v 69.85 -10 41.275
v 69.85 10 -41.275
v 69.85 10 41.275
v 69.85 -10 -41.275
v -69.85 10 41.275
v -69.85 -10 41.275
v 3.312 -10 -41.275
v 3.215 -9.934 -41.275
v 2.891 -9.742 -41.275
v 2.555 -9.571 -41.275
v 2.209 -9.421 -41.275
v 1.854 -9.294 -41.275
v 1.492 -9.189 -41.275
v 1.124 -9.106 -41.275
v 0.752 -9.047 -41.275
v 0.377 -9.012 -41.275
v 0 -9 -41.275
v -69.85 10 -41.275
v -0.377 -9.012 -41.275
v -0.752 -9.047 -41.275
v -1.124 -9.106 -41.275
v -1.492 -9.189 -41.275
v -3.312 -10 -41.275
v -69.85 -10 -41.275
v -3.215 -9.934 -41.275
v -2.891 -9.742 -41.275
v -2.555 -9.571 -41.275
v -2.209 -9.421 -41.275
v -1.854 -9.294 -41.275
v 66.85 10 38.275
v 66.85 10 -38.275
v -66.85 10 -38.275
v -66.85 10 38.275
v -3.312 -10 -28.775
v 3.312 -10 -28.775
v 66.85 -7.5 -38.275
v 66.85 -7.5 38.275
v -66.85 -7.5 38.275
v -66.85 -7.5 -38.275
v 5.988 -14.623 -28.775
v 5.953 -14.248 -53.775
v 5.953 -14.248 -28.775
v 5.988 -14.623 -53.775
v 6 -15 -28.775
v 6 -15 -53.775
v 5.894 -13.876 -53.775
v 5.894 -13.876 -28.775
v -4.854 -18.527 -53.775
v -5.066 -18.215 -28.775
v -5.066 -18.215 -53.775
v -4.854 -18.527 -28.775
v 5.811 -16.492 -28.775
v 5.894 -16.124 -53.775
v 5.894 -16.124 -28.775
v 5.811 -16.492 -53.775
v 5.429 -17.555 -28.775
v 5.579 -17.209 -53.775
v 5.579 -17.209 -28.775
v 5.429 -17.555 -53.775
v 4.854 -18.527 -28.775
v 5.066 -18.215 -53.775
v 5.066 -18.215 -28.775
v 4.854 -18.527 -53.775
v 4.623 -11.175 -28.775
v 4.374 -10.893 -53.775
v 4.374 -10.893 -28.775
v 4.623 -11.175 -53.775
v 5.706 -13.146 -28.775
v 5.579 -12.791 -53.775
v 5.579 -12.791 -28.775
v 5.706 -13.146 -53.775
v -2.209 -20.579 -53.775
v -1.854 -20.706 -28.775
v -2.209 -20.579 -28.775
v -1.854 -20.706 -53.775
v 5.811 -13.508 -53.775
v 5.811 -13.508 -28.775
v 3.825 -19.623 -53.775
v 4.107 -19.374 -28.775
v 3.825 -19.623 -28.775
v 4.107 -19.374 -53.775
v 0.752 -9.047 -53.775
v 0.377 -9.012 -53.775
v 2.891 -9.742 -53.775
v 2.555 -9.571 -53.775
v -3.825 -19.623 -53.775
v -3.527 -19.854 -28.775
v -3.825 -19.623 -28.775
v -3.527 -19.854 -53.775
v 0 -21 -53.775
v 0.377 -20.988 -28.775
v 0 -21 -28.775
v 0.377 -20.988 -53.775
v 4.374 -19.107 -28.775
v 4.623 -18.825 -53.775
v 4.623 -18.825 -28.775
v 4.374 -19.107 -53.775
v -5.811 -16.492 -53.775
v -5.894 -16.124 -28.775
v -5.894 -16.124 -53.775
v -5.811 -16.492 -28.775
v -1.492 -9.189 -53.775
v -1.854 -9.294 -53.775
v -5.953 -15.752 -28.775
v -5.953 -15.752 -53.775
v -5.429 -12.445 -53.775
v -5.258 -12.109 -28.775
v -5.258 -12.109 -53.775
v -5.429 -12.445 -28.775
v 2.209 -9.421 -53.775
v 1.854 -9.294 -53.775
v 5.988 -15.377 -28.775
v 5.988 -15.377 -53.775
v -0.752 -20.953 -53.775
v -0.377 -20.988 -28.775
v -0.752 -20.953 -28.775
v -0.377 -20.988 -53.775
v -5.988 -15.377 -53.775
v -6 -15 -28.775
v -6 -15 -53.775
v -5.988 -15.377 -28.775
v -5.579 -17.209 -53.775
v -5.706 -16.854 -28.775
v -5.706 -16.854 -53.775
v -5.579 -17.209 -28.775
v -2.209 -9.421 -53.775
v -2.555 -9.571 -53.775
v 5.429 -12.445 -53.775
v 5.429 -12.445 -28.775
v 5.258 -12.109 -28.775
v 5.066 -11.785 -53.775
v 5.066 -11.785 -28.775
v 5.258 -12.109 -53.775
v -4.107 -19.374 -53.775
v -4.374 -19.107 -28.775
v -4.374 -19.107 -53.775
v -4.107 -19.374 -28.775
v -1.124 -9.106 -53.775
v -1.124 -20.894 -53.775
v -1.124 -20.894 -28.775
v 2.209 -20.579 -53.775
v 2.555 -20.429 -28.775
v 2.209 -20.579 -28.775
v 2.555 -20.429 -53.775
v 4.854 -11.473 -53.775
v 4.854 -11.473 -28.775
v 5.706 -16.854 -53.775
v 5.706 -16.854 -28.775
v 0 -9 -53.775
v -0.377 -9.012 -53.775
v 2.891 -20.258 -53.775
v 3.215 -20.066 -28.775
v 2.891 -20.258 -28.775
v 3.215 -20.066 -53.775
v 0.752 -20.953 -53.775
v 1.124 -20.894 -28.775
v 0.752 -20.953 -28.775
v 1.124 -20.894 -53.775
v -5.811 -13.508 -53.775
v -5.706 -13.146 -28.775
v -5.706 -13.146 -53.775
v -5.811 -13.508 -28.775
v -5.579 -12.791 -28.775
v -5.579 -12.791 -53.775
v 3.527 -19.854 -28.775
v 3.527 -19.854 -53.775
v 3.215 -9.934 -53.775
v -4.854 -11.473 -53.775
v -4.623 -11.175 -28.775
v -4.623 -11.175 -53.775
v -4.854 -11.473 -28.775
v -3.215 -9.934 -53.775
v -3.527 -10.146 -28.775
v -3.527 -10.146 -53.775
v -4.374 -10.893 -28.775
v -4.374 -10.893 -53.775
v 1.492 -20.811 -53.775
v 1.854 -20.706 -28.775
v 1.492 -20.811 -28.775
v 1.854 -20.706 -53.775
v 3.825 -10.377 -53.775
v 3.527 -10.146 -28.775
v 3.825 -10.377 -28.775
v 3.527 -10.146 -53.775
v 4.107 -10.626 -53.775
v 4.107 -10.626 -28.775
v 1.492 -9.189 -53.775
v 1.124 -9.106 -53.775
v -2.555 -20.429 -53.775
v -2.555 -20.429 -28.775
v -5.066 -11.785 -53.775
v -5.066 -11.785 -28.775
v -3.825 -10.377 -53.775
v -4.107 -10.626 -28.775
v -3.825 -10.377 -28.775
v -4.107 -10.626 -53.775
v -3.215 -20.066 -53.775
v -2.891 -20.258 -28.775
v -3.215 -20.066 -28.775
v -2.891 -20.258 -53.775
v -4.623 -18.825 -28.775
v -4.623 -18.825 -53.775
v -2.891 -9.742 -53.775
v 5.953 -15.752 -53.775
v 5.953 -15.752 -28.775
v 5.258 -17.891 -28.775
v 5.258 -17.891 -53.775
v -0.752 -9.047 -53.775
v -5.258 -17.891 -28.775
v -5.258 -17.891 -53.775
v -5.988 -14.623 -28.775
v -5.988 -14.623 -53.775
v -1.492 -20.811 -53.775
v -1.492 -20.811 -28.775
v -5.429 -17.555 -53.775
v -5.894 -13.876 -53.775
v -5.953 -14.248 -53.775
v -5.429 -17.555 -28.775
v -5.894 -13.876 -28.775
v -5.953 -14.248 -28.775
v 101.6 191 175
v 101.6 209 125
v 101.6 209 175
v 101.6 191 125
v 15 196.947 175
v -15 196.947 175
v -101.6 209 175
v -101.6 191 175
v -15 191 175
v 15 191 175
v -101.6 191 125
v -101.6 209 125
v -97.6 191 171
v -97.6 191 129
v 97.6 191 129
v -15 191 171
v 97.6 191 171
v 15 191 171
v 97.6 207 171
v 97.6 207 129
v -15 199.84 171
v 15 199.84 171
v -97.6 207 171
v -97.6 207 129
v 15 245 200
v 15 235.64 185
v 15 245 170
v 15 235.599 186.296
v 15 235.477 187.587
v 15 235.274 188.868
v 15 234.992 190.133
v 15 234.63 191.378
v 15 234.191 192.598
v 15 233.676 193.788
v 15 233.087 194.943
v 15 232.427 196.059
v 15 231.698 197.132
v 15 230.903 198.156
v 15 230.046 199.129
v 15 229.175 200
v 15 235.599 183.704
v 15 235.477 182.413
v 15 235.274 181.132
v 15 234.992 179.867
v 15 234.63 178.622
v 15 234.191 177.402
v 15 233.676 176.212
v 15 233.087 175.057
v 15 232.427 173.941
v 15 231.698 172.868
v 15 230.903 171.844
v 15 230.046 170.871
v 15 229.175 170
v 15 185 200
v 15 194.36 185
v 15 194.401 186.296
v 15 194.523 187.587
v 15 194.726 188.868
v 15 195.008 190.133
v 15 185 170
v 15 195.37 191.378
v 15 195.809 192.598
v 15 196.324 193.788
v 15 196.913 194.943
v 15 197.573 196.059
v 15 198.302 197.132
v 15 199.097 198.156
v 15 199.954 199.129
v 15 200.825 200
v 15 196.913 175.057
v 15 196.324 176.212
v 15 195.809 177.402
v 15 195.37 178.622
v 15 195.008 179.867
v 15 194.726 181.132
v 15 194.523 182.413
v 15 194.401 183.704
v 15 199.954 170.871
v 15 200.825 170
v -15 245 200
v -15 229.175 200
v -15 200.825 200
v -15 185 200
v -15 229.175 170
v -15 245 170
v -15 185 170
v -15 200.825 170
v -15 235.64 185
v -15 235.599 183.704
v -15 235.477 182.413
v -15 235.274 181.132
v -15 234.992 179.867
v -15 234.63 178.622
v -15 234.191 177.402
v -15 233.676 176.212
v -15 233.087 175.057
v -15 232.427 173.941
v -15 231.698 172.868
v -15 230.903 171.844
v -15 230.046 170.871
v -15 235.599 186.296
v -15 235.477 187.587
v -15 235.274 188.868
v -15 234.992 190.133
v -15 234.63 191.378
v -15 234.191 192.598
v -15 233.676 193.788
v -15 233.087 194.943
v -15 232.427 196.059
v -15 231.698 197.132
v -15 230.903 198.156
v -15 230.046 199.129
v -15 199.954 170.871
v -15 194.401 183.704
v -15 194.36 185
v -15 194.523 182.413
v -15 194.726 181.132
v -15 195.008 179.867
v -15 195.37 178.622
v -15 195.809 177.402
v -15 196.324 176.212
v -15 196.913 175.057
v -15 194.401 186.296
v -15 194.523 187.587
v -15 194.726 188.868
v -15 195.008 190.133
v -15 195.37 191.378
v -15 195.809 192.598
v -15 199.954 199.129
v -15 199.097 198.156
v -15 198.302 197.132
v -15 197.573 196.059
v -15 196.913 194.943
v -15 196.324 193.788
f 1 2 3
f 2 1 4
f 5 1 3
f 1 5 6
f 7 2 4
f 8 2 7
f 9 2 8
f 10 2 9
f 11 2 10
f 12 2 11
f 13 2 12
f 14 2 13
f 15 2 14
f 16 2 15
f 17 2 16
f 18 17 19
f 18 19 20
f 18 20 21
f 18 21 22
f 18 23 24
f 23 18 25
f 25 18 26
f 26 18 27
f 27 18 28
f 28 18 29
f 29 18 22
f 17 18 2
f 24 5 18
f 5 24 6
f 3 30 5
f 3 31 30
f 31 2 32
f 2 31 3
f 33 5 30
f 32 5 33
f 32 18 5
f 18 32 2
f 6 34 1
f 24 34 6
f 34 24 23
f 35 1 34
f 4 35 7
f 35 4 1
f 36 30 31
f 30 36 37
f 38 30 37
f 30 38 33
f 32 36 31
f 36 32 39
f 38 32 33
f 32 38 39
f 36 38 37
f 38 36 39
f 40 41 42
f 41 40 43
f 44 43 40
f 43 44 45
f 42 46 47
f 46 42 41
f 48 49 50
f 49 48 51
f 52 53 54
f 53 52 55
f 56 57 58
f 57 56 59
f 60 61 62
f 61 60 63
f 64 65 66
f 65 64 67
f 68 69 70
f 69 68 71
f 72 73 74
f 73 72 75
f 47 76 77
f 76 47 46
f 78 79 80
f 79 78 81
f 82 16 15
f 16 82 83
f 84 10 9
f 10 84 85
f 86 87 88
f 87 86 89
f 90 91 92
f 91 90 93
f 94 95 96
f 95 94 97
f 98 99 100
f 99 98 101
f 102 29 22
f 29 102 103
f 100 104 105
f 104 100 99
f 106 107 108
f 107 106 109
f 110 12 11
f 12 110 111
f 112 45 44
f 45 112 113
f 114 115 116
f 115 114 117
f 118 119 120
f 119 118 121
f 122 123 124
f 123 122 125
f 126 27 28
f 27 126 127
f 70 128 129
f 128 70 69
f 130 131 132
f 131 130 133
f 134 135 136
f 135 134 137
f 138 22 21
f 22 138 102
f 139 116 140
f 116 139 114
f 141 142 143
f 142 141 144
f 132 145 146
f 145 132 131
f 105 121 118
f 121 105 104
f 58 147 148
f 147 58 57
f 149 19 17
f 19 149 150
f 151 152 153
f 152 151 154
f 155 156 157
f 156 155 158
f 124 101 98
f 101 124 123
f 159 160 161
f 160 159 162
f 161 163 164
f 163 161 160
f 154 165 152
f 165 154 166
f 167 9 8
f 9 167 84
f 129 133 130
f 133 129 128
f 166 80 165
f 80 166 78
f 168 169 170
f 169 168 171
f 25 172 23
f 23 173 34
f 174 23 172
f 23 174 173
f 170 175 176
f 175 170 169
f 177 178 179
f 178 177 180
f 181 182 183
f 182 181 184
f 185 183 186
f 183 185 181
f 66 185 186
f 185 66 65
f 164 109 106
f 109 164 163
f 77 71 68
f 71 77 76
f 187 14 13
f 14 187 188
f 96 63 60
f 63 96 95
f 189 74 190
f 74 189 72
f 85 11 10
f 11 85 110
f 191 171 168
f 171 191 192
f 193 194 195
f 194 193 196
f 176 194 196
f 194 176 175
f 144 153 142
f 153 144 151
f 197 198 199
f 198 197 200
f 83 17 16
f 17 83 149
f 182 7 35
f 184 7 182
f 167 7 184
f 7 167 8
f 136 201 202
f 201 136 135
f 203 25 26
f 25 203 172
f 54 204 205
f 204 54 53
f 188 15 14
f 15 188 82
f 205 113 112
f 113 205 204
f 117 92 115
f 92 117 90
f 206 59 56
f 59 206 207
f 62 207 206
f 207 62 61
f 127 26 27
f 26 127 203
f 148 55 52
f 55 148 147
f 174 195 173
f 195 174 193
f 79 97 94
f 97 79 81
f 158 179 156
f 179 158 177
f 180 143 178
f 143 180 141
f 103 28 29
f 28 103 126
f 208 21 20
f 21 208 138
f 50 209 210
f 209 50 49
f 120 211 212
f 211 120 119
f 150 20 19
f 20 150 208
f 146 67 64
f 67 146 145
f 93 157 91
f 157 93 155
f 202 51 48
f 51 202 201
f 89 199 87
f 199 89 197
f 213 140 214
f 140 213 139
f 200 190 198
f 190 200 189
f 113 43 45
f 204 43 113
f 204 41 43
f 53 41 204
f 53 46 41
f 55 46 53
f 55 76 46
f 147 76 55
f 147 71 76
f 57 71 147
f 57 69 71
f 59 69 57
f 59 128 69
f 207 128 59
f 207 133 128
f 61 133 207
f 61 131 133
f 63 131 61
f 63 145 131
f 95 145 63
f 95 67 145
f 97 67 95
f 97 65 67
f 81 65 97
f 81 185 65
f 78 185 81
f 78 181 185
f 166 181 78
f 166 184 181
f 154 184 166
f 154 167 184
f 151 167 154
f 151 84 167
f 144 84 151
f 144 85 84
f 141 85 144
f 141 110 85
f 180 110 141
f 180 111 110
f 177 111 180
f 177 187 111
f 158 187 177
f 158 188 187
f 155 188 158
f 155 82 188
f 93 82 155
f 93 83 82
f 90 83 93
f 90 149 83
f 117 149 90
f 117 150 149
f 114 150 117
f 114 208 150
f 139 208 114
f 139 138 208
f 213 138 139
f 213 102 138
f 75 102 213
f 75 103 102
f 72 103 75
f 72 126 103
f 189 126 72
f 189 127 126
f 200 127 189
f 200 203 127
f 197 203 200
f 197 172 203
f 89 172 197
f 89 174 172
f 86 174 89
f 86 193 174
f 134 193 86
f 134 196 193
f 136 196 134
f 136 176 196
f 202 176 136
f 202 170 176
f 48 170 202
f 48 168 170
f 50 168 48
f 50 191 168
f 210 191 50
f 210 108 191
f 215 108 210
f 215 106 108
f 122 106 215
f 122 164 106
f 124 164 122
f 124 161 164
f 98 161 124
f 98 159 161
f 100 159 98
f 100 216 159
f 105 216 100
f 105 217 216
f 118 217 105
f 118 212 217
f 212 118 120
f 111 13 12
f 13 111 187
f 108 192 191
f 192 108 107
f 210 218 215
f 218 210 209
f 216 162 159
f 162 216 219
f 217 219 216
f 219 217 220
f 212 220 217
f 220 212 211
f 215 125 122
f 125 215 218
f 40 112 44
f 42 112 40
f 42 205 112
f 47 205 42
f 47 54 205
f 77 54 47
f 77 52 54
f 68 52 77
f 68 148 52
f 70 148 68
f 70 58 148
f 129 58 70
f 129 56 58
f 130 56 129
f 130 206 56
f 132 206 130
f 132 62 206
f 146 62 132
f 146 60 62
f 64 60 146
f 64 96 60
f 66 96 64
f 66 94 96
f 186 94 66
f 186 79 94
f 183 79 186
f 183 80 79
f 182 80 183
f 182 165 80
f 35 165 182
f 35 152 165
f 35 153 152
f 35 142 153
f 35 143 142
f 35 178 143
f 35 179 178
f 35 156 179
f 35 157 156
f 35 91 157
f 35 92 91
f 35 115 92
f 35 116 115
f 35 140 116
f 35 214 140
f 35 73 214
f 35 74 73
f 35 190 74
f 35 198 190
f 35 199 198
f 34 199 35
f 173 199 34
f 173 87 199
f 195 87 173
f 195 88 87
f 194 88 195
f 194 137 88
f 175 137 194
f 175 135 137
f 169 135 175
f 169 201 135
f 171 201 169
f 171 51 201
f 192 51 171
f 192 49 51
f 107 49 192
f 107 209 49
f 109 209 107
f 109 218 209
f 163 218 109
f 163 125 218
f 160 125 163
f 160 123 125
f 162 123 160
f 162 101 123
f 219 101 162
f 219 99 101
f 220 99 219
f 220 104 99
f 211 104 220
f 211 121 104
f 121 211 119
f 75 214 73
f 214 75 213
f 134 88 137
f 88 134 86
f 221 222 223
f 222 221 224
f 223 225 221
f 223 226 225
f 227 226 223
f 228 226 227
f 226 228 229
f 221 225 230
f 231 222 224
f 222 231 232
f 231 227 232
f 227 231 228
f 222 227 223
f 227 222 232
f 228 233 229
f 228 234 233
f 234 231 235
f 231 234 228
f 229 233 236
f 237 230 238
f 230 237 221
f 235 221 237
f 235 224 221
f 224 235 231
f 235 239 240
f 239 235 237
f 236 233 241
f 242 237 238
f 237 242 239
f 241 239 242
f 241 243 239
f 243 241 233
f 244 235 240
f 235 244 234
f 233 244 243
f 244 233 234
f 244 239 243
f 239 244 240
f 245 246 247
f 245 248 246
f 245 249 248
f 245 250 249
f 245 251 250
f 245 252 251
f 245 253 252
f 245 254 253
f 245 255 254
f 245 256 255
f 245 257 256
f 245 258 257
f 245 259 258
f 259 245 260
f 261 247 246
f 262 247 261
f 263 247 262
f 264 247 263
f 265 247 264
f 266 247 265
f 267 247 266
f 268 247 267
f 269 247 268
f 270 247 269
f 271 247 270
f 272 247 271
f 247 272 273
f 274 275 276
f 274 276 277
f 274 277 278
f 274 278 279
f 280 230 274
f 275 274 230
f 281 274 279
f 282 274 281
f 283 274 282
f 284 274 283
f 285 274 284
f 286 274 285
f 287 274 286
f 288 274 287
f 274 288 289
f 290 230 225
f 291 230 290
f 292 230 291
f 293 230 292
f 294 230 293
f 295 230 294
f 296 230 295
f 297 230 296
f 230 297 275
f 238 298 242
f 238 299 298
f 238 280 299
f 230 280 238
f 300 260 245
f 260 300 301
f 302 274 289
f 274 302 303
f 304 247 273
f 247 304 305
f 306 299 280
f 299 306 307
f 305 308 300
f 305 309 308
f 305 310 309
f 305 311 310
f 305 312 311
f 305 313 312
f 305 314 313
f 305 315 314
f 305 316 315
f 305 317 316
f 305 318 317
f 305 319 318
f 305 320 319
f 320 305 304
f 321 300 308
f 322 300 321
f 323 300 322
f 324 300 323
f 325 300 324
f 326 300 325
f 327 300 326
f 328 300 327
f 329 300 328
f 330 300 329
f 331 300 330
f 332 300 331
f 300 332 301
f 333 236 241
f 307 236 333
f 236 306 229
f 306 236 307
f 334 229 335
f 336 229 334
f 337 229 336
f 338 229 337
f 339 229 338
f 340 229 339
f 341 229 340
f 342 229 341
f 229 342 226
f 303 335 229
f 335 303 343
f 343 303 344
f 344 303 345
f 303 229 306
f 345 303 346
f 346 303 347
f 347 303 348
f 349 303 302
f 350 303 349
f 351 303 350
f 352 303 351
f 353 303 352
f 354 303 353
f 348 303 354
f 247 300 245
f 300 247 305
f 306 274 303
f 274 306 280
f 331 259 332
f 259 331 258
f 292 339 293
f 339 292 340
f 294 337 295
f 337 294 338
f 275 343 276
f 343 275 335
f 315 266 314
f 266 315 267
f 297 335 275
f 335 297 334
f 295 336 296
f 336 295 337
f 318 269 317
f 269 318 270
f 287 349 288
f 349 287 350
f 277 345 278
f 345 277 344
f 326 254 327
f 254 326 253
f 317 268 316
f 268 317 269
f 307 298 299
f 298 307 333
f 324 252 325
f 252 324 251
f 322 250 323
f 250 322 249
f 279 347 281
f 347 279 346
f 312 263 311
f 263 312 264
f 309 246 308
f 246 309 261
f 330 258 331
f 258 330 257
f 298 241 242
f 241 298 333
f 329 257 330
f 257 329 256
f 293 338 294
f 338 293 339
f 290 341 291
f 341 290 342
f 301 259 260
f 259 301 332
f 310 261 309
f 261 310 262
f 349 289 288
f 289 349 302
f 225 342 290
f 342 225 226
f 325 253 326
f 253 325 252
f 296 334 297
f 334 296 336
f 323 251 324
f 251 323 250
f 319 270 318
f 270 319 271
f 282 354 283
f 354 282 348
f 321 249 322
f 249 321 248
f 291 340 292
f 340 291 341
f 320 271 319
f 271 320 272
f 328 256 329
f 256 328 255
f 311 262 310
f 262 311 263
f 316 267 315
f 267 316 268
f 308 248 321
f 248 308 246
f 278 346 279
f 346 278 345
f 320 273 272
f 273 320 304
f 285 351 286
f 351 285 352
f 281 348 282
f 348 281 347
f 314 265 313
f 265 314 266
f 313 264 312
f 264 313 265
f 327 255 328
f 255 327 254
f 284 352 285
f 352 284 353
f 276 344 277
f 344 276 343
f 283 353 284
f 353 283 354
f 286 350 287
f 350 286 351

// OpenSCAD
// ====================================================================================
// REVOLUTIONARY TECHNOLOGY COMPANY & UNIVERSITY OF WASHINGTON DEPARTMENT OF PHYSICS
// Subsystem: copo_mirror_assembly.scad (Authentic 1969 Mirror Protection Shells)
// Core Objective: Structural casing for 1969 exterior chrome and interior rearview mirrors
// Center Origin (0,0,0) = Geometric Centerpoint of the Rearview Mirror Mounting Foot
// ====================================================================================

$fn = 100; // High-fidelity die-cast and CNC finish path resolution

// --- 1969 Factory Mirror Dimensions (mm) ---
inch_to_mm         = 25.4;
exterior_mirror_w  = 5.5 * inch_to_mm;    // 139.7 mm classic rectangular side mirror
exterior_mirror_h  = 3.25 * inch_to_mm;   // 82.55 mm height profile
interior_mirror_w  = 8.0 * inch_to_mm;    // 203.2 mm day/night rearview mirror
shell_thickness    = 2.50;                // Thick chrome-plated zinc casing wall

// Roll Cage Tube Diameter Reference (From copo_cage_variants.scad)
cage_tube_dia      = 41.28;               // Standard 1-5/8" safety tube size

module authentic_exterior_mirror() {
    echo("COMPILING 1969 CLASSIC PROFILE EXTERIOR SIDE MIRRORS");
    color("Chrome") { // High-polish mirror finish presentation
        difference() {
            // Main rectangular outer chrome shell casing
            cube([exterior_mirror_w, 20, exterior_mirror_h], center=true);
            
            // Internal pocket recess to house the wide-angle convex optical lens
            translate([0, shell_thickness, 0])
                cube([exterior_mirror_w - 6, 20, exterior_mirror_h - 6], center=true);
        }
        
        // Multi-axis manual swivel adjustment ball joint stem mount
        translate([0, -15, -exterior_mirror_h/2])
            cylinder(d=12.0, h=25, center=true);
    }
}

module interior_cage_rearview_mirror() {
    echo("COMPILING CHROMATIC AUTO-DIMMING REARVIEW COCKPIT MIRROR");
    // Designed to clamp directly onto the front upper windshield loop of the roll cage
    translate([0, 200, 150]) {
        color("DarkCharcoal") {
            difference() {
                // Outer rear protective frame bezel housing
                cube([interior_mirror_w, 18, 50], center=true);
                // Viewport glass pane recess window
                translate([0, -2, 0])
                    cube([interior_mirror_w - 8, 18, 42], center=true);
            }
        }
        
        // INTEGRATED ROLL CAGE MOUNT CLAMP
        color("Silver") {
            translate([0, 15, 35])
                difference() {
                    // Solid aluminum clamp block
                    cube([30, 60, 30], center=true);
                    // Internal borehole matching the 1-5/8" cage halo bar
                    rotate([0, 90, 0])
                        cylinder(d=cage_tube_dia, h=32, center=true);
                }
        }
    }
}

// --- Composite Structural System Instantiation ---
union() {
    authentic_exterior_mirror();
    interior_cage_rearview_mirror();
}
